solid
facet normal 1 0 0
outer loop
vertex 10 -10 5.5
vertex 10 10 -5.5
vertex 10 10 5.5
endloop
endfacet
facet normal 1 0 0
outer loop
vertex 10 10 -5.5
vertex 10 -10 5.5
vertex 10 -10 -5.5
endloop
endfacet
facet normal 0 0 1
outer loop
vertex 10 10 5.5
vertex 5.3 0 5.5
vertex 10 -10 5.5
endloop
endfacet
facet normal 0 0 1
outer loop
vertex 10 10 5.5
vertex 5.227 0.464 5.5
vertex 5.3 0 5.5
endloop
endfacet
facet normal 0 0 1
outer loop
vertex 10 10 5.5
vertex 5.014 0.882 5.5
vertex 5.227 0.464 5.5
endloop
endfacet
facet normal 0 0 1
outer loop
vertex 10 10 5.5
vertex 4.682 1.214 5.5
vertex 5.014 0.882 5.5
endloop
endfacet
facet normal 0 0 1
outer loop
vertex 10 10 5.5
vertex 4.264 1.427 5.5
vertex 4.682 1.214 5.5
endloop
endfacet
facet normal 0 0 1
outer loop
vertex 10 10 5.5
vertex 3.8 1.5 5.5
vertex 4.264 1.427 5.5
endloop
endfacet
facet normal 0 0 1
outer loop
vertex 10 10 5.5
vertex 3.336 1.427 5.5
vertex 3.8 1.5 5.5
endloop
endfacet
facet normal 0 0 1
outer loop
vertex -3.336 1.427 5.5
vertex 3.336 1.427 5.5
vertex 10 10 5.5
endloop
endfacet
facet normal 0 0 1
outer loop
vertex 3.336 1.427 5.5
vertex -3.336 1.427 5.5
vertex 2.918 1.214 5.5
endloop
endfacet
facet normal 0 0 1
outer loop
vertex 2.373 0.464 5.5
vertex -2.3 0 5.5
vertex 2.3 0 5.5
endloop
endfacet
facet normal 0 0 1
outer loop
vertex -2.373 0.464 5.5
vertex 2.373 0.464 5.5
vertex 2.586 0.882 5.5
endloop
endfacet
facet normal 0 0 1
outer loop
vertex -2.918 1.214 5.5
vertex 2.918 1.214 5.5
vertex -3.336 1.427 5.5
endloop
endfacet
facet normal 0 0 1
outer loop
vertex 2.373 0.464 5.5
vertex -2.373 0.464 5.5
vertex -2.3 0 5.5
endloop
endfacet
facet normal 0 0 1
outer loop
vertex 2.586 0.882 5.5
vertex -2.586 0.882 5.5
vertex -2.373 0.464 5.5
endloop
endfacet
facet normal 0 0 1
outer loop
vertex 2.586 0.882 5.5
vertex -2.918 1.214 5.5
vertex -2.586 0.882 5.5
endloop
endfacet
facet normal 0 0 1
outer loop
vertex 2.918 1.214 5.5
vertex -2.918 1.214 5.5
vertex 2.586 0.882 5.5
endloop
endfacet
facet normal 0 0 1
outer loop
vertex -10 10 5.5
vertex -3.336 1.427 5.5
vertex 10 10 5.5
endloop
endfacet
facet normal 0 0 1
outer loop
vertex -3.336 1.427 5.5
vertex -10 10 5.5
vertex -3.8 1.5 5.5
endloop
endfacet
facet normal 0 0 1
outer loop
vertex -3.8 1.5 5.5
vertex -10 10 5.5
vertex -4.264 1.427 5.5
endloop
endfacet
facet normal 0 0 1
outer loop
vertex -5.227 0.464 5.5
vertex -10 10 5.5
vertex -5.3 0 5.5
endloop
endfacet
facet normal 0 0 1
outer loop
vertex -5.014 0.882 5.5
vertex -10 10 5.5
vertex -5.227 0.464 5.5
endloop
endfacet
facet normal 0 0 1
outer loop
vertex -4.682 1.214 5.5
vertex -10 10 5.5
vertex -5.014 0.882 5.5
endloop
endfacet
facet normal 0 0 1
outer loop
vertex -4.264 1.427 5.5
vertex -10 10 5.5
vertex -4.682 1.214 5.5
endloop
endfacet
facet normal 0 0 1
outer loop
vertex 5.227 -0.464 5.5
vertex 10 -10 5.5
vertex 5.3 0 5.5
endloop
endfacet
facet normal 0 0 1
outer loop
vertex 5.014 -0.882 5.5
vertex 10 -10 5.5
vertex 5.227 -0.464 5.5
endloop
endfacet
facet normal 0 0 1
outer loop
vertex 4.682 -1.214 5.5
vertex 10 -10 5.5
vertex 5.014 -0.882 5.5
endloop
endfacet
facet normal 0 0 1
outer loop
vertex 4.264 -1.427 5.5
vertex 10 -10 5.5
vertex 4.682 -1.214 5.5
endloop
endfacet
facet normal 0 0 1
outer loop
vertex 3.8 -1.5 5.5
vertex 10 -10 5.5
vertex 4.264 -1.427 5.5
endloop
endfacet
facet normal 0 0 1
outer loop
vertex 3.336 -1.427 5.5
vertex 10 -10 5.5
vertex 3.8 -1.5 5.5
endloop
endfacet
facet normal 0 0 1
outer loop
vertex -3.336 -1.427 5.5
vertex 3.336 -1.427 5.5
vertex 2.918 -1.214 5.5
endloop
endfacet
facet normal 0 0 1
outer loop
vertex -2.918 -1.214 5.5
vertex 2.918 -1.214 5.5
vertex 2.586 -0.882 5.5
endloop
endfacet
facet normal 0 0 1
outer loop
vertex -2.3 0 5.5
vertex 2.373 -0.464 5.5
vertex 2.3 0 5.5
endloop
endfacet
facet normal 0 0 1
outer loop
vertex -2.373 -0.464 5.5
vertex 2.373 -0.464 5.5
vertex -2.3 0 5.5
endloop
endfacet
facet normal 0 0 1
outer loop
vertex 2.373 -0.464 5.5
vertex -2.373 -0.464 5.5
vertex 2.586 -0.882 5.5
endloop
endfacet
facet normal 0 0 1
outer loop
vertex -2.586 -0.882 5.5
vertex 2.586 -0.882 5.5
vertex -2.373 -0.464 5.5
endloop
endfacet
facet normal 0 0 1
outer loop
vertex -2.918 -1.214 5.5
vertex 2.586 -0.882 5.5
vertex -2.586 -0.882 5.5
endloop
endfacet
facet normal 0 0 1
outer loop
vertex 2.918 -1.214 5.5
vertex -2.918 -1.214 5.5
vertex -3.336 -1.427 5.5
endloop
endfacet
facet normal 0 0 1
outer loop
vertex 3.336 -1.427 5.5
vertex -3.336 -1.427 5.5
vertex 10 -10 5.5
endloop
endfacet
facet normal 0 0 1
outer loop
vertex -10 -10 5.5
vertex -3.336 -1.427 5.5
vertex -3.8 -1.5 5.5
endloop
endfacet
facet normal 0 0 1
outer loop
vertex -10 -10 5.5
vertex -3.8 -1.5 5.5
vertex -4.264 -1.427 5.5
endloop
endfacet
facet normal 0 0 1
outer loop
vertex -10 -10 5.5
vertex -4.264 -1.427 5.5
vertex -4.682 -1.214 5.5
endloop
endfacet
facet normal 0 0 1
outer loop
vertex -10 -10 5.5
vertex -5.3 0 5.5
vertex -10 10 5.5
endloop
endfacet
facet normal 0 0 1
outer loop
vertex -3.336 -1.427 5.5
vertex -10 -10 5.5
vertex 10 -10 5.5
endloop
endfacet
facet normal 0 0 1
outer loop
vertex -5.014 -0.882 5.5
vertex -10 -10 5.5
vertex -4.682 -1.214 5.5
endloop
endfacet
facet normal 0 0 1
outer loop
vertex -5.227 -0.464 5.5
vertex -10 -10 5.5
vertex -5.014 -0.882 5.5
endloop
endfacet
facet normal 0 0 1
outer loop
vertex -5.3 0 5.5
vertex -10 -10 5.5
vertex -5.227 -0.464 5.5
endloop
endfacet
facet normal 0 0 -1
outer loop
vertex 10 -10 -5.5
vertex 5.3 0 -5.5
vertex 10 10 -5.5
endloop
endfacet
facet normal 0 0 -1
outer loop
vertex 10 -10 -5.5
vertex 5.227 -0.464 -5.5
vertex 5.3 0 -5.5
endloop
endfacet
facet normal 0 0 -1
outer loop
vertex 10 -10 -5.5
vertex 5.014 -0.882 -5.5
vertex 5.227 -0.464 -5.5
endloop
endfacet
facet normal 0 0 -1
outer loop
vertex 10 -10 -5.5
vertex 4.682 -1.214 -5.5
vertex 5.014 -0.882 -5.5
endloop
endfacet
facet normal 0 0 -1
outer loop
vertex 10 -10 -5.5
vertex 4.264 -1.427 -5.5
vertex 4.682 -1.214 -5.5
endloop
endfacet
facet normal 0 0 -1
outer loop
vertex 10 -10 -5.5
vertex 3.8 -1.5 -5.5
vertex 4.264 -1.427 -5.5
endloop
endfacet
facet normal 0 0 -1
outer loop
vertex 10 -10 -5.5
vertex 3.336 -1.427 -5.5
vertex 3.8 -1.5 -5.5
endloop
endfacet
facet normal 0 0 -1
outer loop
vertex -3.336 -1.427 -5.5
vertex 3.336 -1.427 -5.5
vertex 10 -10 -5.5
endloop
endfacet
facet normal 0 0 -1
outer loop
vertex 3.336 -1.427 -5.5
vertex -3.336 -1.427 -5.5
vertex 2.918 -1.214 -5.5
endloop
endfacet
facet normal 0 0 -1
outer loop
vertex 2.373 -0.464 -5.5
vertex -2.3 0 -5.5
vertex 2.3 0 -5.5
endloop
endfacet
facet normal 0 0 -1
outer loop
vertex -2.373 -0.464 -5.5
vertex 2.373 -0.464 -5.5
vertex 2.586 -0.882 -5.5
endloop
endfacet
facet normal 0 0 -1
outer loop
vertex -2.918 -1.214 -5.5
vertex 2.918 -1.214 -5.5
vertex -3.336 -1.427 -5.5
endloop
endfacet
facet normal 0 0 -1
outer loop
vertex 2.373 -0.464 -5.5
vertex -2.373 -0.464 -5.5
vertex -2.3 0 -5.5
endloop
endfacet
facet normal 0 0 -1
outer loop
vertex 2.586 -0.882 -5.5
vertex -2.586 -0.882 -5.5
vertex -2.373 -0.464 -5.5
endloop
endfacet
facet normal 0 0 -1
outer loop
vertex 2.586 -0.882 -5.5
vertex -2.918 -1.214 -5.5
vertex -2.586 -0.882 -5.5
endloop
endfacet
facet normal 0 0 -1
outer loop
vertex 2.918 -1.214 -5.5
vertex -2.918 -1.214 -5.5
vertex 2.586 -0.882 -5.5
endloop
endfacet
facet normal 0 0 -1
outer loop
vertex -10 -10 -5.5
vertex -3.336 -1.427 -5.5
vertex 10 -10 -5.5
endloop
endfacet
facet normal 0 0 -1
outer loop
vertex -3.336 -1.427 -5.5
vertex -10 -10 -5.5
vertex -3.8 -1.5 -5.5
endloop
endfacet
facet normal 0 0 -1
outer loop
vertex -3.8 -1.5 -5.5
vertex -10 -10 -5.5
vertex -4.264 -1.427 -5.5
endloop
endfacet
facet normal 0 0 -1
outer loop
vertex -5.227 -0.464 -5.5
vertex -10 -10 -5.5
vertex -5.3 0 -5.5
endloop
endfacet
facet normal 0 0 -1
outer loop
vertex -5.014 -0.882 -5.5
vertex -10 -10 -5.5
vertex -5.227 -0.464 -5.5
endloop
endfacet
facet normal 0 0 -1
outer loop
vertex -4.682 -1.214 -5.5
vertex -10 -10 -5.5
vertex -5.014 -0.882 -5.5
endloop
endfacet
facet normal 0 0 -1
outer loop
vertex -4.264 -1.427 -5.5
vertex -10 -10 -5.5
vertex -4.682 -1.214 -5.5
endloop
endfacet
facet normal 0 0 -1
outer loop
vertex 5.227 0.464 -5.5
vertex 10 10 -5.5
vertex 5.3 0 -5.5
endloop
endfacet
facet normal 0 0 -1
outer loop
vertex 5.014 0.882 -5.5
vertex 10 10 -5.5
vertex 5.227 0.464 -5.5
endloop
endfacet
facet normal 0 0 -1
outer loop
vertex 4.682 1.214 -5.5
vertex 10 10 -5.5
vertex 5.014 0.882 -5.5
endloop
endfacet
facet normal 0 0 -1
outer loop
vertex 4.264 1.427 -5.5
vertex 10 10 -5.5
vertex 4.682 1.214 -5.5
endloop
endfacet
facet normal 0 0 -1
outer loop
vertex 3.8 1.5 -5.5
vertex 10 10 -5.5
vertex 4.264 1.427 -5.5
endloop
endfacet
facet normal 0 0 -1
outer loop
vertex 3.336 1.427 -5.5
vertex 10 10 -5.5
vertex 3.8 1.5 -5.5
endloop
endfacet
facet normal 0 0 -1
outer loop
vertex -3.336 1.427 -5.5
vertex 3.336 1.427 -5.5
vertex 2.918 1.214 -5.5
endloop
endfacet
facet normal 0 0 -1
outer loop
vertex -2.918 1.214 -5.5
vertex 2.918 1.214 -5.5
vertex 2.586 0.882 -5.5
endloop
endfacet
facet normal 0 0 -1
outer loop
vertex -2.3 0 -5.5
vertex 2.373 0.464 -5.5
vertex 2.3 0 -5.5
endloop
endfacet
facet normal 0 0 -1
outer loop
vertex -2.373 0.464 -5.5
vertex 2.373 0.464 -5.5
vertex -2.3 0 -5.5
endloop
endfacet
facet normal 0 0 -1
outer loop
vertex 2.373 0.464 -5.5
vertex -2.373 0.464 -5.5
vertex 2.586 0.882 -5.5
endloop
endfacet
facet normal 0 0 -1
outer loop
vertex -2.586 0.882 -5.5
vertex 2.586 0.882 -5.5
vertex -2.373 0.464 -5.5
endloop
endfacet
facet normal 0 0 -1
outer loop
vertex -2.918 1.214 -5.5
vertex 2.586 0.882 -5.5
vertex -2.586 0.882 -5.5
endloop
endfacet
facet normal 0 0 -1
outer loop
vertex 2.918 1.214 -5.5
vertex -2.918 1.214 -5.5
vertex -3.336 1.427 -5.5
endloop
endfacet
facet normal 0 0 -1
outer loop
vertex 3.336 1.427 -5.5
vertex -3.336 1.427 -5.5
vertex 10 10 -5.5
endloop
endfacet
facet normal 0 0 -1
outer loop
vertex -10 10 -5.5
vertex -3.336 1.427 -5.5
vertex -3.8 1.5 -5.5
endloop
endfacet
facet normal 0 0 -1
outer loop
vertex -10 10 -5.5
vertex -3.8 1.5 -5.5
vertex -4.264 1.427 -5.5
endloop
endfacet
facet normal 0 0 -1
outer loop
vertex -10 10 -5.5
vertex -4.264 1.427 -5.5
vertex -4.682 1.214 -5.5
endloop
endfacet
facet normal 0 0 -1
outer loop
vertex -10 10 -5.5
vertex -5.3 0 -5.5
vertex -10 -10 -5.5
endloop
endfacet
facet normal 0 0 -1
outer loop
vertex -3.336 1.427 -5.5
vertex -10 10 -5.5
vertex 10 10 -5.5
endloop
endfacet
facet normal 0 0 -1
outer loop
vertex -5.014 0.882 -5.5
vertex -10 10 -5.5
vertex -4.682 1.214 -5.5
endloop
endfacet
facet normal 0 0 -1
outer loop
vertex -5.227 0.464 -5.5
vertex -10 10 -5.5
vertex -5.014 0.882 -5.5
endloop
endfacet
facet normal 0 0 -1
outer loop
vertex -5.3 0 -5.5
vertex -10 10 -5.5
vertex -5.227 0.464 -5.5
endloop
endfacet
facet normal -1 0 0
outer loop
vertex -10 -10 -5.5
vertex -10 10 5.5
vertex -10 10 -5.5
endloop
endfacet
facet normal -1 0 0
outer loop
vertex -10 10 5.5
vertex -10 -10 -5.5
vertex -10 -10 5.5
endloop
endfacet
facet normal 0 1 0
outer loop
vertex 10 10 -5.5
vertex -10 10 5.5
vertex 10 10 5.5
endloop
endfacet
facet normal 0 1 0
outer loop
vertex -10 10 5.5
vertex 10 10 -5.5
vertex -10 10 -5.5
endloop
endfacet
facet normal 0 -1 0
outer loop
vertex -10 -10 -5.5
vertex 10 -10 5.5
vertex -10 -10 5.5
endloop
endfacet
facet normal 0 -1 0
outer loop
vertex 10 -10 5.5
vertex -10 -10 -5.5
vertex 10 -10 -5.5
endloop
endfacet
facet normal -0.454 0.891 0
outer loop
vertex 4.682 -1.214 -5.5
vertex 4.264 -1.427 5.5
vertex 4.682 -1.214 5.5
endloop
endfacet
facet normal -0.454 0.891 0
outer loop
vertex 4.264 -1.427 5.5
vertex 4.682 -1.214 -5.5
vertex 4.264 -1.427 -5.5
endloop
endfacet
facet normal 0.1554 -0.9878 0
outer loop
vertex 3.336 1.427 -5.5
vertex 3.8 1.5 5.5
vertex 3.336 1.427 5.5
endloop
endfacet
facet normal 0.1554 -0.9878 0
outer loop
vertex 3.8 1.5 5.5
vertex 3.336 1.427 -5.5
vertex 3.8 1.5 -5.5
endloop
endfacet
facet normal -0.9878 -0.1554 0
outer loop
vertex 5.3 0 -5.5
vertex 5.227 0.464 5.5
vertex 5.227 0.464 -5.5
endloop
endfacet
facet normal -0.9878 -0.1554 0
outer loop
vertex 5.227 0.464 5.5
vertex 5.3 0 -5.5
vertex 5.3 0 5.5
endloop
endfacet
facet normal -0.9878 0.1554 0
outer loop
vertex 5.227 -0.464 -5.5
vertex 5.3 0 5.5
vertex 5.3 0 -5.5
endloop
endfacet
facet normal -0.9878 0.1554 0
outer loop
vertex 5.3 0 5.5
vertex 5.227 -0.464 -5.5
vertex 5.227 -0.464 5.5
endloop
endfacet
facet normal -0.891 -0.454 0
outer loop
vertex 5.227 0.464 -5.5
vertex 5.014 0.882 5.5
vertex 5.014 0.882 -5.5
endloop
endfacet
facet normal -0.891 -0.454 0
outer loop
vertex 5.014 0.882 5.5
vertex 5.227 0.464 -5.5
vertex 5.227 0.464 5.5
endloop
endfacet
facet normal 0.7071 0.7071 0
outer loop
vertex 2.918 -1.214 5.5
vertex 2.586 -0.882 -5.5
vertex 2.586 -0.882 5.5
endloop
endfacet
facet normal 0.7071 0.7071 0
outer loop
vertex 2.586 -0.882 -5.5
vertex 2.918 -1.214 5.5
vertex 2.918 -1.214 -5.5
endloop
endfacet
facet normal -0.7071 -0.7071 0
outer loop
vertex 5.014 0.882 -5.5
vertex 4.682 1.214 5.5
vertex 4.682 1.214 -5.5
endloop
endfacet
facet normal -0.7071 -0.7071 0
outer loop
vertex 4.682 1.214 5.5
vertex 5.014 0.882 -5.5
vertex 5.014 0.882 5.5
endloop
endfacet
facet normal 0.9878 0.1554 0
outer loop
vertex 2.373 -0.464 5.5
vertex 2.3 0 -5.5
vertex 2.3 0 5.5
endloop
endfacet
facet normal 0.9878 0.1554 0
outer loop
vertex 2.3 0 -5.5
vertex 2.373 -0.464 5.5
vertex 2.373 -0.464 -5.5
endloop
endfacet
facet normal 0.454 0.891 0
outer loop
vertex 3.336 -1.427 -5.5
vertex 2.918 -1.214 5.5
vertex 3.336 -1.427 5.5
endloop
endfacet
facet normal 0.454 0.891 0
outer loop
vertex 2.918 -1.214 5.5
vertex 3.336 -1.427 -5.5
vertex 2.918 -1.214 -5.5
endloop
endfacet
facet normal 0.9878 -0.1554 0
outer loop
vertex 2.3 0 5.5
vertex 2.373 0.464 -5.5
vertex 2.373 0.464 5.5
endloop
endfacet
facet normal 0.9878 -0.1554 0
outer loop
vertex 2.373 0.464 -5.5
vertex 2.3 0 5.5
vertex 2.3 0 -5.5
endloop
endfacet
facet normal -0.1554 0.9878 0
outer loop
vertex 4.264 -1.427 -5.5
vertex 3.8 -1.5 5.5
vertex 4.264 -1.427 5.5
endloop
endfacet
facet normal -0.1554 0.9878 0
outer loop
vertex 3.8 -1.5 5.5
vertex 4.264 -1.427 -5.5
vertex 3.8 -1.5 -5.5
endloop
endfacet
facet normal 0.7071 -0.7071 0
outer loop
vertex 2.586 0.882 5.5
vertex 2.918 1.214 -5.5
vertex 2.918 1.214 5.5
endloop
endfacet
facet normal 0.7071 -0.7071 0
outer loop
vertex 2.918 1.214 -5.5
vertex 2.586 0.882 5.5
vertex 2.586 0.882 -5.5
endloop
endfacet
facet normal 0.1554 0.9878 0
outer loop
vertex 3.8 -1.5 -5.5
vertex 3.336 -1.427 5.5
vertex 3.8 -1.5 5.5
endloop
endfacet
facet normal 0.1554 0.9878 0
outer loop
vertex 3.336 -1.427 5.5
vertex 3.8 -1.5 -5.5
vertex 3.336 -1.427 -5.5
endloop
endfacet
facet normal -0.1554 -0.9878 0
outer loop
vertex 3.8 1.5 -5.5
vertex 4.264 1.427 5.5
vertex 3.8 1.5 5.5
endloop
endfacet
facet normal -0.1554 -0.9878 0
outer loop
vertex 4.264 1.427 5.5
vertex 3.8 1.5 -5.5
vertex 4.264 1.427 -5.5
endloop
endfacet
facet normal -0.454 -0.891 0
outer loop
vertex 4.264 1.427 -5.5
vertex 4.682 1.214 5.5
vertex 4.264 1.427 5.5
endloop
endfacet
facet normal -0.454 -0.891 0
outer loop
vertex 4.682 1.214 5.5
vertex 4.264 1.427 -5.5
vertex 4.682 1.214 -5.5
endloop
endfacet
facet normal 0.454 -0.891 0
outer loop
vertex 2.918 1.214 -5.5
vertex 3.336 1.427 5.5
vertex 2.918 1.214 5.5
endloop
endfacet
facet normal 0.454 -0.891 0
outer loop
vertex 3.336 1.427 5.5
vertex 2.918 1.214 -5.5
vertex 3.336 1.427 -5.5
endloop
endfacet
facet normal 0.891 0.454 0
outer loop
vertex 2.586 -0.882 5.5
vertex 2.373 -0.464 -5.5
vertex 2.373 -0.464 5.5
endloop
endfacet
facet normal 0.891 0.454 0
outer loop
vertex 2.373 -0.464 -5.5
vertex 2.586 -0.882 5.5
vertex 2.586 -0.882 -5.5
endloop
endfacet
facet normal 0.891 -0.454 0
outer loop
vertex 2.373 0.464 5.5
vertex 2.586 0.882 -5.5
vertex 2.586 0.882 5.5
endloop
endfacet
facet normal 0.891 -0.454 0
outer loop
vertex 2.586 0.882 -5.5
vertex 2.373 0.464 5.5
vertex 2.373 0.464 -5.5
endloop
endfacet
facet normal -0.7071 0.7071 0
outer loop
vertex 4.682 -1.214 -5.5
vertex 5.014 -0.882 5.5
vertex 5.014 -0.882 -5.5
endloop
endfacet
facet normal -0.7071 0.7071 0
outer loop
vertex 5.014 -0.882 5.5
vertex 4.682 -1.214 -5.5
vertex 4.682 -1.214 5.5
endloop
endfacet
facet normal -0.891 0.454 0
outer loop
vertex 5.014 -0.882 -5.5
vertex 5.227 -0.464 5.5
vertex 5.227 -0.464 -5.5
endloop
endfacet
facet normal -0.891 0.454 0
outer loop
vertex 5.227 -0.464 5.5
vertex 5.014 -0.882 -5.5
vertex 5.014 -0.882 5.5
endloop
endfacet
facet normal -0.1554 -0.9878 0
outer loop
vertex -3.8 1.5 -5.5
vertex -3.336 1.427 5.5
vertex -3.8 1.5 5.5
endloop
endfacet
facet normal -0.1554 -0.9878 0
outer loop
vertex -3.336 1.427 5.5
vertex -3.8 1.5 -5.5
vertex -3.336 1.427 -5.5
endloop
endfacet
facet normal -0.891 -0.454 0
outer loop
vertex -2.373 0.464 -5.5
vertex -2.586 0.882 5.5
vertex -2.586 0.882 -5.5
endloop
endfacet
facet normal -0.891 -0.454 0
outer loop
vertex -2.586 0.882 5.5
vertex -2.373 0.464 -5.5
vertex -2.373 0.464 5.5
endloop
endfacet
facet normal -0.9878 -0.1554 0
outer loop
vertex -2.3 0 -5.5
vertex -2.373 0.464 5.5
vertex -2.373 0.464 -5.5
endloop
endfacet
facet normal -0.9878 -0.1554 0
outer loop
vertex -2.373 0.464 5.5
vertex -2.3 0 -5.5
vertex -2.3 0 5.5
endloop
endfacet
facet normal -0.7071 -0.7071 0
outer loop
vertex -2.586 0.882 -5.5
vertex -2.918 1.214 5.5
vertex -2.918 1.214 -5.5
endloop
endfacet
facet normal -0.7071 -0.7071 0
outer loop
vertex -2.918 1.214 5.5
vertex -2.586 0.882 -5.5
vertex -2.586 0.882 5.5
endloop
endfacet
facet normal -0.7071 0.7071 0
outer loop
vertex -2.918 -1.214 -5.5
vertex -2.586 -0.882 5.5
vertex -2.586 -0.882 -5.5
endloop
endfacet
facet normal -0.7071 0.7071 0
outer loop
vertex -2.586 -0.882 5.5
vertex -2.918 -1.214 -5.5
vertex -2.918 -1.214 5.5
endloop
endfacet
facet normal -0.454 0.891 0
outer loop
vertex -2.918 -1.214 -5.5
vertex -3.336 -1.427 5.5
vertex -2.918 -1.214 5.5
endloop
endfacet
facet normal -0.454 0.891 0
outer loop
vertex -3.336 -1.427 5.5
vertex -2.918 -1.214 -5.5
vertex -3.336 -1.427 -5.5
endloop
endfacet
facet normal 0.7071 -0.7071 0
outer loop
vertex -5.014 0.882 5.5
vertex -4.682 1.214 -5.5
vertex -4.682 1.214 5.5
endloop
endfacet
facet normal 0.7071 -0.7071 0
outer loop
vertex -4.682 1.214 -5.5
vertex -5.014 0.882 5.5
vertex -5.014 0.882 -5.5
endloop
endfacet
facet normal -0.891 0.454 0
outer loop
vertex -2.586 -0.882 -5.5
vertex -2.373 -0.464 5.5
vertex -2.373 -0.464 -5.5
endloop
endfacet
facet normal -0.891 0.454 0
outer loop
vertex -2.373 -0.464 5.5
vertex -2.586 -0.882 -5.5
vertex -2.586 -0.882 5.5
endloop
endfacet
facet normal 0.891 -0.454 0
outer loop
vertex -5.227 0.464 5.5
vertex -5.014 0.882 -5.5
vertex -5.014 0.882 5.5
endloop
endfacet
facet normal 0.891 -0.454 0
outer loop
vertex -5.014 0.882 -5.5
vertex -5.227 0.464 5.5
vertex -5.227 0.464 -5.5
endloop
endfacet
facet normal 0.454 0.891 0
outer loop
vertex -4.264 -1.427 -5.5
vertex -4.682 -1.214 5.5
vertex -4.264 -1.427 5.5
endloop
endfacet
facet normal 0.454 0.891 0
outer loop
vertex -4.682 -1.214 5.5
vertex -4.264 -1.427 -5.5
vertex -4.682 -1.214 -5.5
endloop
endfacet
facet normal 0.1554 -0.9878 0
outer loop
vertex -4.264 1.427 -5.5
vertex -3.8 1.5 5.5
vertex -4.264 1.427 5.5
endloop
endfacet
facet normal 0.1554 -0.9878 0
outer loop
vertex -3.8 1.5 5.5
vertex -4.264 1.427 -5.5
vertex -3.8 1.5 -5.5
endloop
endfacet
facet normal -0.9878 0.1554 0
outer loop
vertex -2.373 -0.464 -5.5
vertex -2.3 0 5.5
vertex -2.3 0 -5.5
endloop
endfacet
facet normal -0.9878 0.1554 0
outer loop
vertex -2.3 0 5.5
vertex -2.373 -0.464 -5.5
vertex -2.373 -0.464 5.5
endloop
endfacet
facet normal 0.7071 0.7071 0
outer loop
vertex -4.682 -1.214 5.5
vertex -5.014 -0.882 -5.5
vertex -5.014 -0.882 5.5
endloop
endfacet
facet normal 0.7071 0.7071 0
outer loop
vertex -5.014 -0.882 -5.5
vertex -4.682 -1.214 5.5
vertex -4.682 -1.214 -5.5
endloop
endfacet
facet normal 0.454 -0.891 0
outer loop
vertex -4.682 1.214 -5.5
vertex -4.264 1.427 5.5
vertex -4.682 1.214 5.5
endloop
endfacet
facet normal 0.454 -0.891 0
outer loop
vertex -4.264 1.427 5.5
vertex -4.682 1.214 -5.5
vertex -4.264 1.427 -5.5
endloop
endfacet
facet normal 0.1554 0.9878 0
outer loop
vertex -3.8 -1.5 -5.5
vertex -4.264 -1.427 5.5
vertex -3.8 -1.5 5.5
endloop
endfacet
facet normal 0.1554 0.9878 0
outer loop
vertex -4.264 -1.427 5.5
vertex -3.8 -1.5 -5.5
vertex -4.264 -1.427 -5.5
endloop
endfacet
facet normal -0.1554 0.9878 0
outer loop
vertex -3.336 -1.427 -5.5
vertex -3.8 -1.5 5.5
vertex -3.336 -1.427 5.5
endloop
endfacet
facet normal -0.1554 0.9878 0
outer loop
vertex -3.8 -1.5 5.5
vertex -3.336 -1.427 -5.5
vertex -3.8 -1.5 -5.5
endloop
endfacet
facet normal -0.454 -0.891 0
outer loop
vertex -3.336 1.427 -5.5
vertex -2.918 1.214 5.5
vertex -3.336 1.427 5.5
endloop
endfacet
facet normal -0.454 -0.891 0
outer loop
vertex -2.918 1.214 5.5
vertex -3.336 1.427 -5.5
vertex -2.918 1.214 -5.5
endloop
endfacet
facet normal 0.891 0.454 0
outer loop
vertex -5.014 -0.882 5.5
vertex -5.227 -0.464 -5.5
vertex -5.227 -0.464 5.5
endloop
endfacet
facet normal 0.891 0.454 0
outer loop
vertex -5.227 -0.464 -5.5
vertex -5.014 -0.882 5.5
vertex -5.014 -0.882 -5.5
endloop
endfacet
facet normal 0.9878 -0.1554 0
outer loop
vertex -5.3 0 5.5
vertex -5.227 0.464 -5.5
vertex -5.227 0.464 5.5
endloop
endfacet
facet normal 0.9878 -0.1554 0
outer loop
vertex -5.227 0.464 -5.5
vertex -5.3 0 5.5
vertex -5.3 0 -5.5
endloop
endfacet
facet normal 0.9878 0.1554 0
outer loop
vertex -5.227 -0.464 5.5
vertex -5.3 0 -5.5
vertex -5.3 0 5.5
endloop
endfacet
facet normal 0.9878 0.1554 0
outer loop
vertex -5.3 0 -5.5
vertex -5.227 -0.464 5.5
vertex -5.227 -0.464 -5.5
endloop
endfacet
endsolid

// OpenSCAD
// Raised support for photosensor
//

support_side = 20;
support_height = 11;

hole_radius = 1.5;
hole_offset = 3.8;
INF = 100000;

difference() {
    cube([support_side, support_side, support_height], center = true);
    translate([hole_offset, 0, 0]) cylinder(r=hole_radius, h=INF, center=true, $fn=20);
    translate([-hole_offset, 0, 0]) cylinder(r=hole_radius, h=INF, center=true, $fn=20);
}
